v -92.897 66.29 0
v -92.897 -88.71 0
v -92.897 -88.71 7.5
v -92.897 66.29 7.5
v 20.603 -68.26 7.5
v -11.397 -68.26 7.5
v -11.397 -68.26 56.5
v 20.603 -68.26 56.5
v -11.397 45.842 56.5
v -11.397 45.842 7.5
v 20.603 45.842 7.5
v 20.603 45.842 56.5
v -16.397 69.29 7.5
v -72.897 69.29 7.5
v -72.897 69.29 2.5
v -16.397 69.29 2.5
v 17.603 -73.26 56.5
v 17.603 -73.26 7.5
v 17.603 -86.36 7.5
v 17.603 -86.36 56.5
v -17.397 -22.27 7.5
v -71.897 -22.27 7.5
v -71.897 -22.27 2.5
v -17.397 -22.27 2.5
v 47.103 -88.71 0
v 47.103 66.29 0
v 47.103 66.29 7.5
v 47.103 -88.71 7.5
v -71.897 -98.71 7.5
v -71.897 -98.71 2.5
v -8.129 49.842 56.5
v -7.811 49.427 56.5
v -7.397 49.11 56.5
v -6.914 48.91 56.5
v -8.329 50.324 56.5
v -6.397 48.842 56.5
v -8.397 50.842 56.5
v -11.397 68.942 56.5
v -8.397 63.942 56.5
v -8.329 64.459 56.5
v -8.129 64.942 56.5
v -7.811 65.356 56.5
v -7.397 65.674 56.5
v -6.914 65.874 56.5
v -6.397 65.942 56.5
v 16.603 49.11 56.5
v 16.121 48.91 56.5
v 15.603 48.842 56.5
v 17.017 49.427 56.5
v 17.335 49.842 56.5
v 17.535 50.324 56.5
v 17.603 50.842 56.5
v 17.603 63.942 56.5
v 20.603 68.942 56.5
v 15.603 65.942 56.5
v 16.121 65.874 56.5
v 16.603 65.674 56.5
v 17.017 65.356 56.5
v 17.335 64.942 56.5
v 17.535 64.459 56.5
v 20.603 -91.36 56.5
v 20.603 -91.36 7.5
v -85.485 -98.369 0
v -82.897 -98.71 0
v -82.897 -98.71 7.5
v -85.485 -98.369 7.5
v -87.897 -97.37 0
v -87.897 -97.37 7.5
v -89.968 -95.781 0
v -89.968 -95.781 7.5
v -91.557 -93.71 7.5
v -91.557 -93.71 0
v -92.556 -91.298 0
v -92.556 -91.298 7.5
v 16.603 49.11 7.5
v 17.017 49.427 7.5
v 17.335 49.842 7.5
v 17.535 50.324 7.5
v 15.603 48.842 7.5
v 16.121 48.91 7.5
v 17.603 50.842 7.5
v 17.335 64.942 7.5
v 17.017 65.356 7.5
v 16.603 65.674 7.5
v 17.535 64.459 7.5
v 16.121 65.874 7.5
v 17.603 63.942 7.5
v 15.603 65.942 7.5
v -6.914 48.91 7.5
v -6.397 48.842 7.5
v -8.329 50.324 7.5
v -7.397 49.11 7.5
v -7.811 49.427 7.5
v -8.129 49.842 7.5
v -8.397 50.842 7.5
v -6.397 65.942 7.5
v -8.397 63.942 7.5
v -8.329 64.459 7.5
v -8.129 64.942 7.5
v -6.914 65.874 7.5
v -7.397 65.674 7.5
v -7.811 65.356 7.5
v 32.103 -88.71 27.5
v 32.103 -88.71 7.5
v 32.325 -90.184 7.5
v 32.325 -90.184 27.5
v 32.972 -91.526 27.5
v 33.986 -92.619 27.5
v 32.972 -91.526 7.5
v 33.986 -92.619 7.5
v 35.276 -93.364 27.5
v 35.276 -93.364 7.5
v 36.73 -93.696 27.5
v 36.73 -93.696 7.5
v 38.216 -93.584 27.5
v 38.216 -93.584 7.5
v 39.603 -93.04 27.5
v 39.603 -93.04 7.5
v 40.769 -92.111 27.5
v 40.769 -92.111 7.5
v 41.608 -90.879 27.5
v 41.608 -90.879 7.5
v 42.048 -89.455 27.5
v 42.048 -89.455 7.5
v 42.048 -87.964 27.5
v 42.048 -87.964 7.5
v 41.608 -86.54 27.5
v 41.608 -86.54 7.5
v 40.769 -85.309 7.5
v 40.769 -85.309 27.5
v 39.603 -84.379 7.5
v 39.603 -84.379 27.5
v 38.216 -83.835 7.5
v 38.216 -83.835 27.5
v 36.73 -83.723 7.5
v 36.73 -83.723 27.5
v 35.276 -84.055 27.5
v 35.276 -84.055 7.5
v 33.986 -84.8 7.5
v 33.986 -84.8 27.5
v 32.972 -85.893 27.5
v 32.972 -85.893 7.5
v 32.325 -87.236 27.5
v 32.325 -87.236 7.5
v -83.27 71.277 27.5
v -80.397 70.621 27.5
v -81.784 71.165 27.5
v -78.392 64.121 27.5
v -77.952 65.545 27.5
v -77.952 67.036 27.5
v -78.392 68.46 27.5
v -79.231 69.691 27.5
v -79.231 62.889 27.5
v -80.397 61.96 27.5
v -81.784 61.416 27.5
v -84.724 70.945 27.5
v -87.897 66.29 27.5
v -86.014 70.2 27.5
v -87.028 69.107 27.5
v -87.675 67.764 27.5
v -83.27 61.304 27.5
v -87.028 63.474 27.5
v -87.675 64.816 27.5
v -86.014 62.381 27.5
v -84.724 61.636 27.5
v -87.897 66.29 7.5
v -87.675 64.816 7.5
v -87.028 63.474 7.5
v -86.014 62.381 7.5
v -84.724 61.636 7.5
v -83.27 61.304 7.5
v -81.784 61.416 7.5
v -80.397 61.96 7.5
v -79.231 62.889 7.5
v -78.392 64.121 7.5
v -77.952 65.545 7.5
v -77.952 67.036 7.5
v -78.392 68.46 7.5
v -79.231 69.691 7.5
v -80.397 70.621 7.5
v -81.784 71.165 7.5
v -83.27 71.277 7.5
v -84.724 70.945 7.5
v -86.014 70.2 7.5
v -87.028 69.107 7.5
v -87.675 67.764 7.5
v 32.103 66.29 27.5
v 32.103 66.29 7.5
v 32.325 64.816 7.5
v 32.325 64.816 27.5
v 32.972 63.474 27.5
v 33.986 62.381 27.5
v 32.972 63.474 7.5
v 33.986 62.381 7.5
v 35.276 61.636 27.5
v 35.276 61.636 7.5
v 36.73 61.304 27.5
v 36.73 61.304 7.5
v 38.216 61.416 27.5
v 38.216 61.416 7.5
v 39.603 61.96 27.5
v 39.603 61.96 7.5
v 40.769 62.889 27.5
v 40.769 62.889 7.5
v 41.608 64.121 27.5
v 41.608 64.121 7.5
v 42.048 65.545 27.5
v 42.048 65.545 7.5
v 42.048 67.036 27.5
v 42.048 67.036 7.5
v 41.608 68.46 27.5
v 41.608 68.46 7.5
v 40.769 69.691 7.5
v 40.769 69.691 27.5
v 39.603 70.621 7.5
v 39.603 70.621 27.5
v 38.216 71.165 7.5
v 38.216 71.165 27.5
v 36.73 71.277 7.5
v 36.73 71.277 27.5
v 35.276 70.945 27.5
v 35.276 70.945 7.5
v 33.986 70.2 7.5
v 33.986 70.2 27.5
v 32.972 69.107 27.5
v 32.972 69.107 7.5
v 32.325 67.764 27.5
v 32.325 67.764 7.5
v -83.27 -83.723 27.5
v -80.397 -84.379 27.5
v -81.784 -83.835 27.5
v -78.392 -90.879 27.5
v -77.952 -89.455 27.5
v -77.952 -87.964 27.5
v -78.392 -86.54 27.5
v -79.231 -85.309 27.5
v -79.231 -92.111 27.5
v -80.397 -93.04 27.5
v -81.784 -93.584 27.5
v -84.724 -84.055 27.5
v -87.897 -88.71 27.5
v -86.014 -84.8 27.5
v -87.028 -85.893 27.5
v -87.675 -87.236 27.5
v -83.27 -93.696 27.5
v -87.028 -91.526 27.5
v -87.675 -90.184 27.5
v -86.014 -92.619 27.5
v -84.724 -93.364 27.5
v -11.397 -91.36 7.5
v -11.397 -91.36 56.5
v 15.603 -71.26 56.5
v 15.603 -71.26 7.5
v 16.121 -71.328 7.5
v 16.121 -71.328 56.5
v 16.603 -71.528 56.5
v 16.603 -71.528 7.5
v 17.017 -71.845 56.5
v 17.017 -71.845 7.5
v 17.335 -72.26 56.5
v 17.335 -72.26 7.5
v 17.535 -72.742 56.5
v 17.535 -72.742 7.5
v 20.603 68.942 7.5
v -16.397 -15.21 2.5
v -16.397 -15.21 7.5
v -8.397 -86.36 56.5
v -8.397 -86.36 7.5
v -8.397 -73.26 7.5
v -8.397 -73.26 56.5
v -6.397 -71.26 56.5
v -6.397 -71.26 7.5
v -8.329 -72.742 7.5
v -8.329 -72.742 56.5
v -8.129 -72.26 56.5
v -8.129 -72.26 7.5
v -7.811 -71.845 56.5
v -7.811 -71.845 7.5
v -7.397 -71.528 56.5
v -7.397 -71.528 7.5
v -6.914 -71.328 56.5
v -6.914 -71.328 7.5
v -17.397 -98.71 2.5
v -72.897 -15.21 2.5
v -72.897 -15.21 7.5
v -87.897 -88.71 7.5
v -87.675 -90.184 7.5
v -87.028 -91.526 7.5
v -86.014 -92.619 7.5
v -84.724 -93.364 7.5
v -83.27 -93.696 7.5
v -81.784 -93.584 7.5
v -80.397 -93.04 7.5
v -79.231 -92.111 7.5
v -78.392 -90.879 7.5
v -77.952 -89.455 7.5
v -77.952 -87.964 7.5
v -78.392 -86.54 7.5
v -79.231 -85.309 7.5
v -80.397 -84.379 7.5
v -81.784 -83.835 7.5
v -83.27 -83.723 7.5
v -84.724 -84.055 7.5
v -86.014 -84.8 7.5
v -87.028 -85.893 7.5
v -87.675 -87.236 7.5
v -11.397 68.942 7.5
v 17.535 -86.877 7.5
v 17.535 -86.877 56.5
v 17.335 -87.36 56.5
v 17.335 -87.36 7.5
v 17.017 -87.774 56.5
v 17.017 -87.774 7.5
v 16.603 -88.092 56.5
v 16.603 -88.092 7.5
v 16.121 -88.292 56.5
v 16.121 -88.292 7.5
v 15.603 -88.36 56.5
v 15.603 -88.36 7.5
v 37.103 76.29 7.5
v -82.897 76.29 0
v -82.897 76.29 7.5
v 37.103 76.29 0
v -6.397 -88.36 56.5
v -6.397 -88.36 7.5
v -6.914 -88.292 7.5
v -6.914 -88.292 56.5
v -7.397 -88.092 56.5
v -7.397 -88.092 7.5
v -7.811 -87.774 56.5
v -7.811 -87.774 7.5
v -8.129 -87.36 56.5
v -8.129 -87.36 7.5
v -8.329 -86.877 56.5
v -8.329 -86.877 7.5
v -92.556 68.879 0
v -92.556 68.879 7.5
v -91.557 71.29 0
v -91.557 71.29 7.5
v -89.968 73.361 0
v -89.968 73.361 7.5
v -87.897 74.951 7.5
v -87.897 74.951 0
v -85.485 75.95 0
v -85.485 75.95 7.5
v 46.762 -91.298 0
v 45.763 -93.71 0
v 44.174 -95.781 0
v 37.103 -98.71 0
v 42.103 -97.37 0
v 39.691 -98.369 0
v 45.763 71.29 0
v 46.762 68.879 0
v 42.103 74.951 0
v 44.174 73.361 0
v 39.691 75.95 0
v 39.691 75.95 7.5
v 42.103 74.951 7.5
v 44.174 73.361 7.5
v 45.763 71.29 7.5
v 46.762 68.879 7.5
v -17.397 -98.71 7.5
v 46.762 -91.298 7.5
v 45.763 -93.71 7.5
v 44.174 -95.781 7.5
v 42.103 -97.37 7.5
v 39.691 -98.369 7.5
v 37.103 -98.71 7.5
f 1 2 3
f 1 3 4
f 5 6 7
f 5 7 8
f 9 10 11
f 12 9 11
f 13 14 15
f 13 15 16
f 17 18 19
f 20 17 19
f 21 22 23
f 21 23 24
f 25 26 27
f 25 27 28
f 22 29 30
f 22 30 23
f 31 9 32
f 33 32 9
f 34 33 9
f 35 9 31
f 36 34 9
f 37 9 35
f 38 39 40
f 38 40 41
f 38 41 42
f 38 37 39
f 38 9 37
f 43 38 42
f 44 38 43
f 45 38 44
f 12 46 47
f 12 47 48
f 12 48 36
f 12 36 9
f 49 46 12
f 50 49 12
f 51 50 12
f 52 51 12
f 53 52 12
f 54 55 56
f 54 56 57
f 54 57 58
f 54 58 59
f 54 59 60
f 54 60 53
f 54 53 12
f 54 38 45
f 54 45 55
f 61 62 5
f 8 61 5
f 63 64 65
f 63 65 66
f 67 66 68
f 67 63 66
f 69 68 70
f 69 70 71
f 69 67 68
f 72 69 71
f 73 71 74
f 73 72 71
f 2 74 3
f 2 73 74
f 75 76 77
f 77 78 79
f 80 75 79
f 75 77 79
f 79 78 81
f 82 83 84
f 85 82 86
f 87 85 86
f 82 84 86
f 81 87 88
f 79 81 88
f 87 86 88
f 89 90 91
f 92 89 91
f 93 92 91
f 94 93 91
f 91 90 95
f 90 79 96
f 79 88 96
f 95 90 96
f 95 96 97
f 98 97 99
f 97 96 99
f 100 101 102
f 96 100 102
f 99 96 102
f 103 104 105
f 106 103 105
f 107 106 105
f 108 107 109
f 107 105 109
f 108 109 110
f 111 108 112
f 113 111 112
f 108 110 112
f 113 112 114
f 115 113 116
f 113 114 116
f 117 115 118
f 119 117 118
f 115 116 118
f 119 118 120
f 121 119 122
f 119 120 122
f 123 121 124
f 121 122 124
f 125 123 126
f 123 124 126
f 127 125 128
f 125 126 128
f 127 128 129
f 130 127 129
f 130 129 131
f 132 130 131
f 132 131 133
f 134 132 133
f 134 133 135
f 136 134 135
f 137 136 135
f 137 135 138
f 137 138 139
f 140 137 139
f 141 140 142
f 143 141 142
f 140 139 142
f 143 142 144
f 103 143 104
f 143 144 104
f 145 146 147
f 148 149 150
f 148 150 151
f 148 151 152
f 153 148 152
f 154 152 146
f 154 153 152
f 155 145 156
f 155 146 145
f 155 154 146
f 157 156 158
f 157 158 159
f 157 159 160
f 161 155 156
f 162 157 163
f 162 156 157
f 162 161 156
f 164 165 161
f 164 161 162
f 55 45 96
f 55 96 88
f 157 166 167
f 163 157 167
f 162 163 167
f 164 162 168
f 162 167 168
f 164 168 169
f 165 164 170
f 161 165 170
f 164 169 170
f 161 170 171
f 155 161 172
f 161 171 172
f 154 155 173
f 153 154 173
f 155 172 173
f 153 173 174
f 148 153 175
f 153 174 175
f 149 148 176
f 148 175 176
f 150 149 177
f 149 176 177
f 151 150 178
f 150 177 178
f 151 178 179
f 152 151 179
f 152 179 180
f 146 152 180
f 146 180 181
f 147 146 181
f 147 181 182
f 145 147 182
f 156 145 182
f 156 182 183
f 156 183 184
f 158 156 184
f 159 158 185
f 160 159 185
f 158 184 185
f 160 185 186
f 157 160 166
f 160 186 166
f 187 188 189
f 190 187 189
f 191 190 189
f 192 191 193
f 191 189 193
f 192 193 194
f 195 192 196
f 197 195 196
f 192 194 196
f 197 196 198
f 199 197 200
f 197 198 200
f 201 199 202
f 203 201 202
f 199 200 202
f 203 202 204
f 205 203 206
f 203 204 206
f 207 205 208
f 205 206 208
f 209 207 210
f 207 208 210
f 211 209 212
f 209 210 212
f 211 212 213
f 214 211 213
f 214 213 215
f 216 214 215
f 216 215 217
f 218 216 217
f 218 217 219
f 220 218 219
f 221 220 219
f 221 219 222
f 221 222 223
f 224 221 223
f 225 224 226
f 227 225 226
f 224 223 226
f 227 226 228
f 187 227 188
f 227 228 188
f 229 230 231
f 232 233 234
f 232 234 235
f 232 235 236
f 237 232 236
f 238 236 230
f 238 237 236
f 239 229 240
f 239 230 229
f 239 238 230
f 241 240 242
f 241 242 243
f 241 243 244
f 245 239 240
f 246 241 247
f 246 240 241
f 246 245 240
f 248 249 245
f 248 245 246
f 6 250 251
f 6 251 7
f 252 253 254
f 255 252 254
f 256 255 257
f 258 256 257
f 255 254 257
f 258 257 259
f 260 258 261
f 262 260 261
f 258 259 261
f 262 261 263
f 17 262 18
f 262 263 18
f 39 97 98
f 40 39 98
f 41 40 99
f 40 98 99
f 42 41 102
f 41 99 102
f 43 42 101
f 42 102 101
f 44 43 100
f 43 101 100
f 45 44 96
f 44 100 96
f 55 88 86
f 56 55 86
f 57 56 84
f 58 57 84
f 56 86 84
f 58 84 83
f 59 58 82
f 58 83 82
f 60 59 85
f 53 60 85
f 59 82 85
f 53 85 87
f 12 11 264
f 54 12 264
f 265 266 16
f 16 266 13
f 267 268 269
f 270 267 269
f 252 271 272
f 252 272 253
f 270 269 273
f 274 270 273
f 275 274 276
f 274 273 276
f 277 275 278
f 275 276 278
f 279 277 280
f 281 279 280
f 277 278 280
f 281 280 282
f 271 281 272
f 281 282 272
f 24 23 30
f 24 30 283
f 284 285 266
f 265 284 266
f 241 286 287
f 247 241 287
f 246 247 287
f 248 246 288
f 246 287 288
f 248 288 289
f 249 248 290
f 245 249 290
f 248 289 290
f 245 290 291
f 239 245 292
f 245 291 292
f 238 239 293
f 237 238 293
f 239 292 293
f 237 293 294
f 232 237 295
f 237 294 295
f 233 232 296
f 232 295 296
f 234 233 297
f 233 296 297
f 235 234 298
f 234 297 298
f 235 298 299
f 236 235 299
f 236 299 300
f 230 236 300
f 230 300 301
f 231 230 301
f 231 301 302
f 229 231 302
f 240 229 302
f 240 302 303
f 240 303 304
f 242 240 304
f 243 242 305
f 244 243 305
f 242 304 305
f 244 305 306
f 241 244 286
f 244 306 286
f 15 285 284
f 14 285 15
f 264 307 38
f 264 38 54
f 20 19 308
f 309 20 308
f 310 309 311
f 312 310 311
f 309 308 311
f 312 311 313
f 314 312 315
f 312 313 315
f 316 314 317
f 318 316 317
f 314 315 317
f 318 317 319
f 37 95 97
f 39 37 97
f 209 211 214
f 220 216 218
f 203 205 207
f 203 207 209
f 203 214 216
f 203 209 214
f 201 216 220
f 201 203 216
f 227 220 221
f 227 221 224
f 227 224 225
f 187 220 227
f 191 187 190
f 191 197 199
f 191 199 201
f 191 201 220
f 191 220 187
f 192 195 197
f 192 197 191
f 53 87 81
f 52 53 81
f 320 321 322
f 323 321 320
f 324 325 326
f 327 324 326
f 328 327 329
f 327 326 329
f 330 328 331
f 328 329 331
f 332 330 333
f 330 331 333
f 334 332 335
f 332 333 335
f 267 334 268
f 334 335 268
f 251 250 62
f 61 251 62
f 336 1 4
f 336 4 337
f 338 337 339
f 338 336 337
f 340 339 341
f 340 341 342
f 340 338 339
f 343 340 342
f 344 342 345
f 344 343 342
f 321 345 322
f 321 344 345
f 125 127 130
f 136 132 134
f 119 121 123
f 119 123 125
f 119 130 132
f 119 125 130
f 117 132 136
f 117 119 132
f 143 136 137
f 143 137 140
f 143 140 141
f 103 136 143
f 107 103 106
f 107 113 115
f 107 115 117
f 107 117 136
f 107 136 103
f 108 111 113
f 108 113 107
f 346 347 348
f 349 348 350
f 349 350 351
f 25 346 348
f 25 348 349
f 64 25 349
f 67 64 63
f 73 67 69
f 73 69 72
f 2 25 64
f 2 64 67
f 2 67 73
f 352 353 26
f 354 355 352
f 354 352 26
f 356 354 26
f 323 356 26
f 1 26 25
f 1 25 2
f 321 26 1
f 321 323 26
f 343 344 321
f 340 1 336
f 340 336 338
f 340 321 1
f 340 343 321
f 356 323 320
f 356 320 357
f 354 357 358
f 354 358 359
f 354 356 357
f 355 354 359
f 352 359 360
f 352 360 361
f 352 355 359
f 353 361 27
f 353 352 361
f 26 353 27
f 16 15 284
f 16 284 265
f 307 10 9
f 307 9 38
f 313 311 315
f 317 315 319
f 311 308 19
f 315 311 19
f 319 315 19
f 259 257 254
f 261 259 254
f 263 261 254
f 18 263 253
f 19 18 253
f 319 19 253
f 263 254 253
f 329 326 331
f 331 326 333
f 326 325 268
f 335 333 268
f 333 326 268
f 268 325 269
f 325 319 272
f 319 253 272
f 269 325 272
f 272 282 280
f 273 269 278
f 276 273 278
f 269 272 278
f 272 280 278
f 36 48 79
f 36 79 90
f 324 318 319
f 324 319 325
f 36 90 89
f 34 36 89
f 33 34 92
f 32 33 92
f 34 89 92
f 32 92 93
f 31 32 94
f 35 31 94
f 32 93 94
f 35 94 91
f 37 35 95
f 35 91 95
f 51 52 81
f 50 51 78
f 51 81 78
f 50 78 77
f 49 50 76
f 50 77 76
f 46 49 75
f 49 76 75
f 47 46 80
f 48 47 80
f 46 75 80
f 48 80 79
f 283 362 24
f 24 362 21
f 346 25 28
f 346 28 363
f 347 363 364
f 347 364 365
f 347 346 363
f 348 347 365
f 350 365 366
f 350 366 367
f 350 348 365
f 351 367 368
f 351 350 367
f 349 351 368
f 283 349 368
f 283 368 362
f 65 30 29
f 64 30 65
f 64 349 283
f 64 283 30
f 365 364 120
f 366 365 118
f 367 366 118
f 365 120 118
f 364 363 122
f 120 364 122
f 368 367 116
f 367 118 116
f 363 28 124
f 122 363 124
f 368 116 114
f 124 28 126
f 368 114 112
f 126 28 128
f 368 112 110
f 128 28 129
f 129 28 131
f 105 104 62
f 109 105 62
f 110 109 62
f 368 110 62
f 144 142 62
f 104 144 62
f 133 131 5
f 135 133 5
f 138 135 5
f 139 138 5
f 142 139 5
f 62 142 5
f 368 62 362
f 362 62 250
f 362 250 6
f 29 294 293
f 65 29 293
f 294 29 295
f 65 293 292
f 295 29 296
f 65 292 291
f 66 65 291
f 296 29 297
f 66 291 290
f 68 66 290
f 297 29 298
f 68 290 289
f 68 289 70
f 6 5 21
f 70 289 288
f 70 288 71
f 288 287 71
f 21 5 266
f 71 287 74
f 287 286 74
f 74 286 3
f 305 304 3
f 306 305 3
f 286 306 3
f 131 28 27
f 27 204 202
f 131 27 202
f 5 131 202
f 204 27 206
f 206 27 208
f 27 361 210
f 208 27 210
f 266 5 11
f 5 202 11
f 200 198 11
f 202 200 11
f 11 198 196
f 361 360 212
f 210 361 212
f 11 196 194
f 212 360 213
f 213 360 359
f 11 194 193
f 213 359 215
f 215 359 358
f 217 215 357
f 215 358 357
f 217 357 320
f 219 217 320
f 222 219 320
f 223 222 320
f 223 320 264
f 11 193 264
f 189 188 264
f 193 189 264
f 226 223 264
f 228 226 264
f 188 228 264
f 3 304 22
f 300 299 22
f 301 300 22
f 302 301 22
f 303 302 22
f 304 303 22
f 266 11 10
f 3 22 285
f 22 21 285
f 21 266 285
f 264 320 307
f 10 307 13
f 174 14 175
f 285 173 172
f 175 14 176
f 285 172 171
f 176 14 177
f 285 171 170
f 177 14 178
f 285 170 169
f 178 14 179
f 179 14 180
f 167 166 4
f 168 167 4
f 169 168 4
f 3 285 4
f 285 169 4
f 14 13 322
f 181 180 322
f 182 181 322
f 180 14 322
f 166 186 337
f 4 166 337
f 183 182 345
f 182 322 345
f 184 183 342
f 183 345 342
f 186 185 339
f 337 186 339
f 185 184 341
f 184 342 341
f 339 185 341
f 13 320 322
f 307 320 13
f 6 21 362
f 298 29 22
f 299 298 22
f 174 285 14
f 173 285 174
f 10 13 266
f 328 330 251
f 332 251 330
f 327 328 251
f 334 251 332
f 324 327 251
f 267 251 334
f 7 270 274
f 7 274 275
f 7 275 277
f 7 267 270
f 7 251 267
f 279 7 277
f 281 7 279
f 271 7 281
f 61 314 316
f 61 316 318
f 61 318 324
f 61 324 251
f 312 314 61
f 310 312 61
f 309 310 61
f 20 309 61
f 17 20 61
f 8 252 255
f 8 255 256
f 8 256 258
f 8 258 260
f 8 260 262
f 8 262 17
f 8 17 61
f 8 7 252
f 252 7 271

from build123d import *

# Parameters (mm, degrees)
BOSS_EXTRUDE1_DEPTH = 7.5
SKETCH3_W           = 56.5
SKETCH3_H           = 84.5
SKETCH3_W_2         = 54.5
SKETCH3_H_2         = 69.44
CUT_EXTRUDE1_DEPTH  = 5
SKETCH4_W           = 54.5
SKETCH4_H           = 9.636528607
CUT_EXTRUDE2_DEPTH  = 5
SKETCH5_W           = 32
SKETCH5_H           = 23.1
BOSS_EXTRUDE2_DEPTH = 49
SKETCH6_W           = 32
SKETCH6_H           = 23.1
BOSS_EXTRUDE3_DEPTH = 49
SKETCH7_R           = 5.000174567
BOSS_EXTRUDE4_DEPTH = 20


with BuildPart() as part:
    # Sketch2 → Boss-Extrude1 (new body)
    with BuildSketch(Plane.XY):
        with BuildLine():
            Line((-82.896774194, 76.290322581), (37.103225806, 76.290322581))
            ThreePointArc((37.103225806, 76.290322581), (44.174293618, 73.361390393), (47.103225806, 66.290322581))
            Line((47.103225806, 66.290322581), (47.103225806, -88.709677419))
            ThreePointArc((47.103225806, -88.709677419), (44.174293618, -95.780745231), (37.103225806, -98.709677419))
            Line((37.103225806, -98.709677419), (-82.896774194, -98.709677419))
            ThreePointArc((-82.896774194, -98.709677419), (-89.967842005, -95.780745231), (-92.896774194, -88.709677419))
            Line((-92.896774194, -88.709677419), (-92.896774194, 66.290322581))
            ThreePointArc((-92.896774194, 66.290322581), (-89.967842005, 73.361390393), (-82.896774194, 76.290322581))
        make_face()
    extrude(amount=BOSS_EXTRUDE1_DEPTH)

    # Sketch3 → Cut-Extrude1 (cut)
    with BuildSketch(Plane.XY.offset(7.5)):
        with Locations((-44.646774194, 27.040322581)):
            Rectangle(SKETCH3_W, SKETCH3_H)
        with Locations((-44.646774194, -56.989677419)):
            Rectangle(SKETCH3_W_2, SKETCH3_H_2)
    extrude(amount=-CUT_EXTRUDE1_DEPTH, mode=Mode.SUBTRACT)

    # Sketch4 → Cut-Extrude2 (cut)
    with BuildSketch(Plane.XY.offset(7.5)):
        with Locations((-44.646774194, -96.527941723)):
            Rectangle(SKETCH4_W, SKETCH4_H)
    extrude(amount=-CUT_EXTRUDE2_DEPTH, mode=Mode.SUBTRACT)

    # Sketch5 → Boss-Extrude2 (add)
    with BuildSketch(Plane.XY.offset(7.5)):
        with Locations((4.603225806, 57.39165706)):
            Rectangle(SKETCH5_W, SKETCH5_H)
        with BuildLine():
            Line((-6.396774194, 65.94165706), (15.603225806, 65.94165706))
            ThreePointArc((15.603225806, 65.94165706), (17.017439369, 65.355870623), (17.603225806, 63.94165706))
            Line((17.603225806, 63.94165706), (17.603225806, 50.84165706))
            ThreePointArc((17.603225806, 50.84165706), (17.017439369, 49.427443498), (15.603225806, 48.84165706))
            Line((15.603225806, 48.84165706), (-6.396774194, 48.84165706))
            ThreePointArc((-6.396774194, 48.84165706), (-7.810987756, 49.427443498), (-8.396774194, 50.84165706))
            Line((-8.396774194, 50.84165706), (-8.396774194, 63.94165706))
            ThreePointArc((-8.396774194, 63.94165706), (-7.810987756, 65.355870623), (-6.396774194, 65.94165706))
        make_face(mode=Mode.SUBTRACT)
    extrude(amount=BOSS_EXTRUDE2_DEPTH)

    # Sketch6 → Boss-Extrude3 (add)
    with BuildSketch(Plane.XY.offset(7.5)):
        with Locations((4.603225806, -79.809677419)):
            Rectangle(SKETCH6_W, SKETCH6_H)
        with BuildLine():
            Line((-6.396774194, -71.259677419), (15.603225806, -71.259677419))
            ThreePointArc((15.603225806, -71.259677419), (17.017439369, -71.845463857), (17.603225806, -73.259677419))
            Line((17.603225806, -73.259677419), (17.603225806, -86.359677419))
            ThreePointArc((17.603225806, -86.359677419), (17.017439369, -87.773890982), (15.603225806, -88.359677419))
            Line((15.603225806, -88.359677419), (-6.396774194, -88.359677419))
            ThreePointArc((-6.396774194, -88.359677419), (-7.810987756, -87.773890982), (-8.396774194, -86.359677419))
            Line((-8.396774194, -86.359677419), (-8.396774194, -73.259677419))
            ThreePointArc((-8.396774194, -73.259677419), (-7.810987756, -71.845463857), (-6.396774194, -71.259677419))
        make_face(mode=Mode.SUBTRACT)
    extrude(amount=BOSS_EXTRUDE3_DEPTH)

    # Sketch7 → Boss-Extrude4 (add)
    with BuildSketch(Plane.XY.offset(7.5)):
        with Locations((-82.896774194, 66.290322581)):
            Circle(SKETCH7_R)
        with Locations((37.103225806, 66.290322581)):
            Circle(SKETCH7_R)
        with Locations((-82.896774194, -88.709677419)):
            Circle(SKETCH7_R)
        with Locations((37.103225806, -88.709677419)):
            Circle(SKETCH7_R)
    extrude(amount=BOSS_EXTRUDE4_DEPTH)


solid = part.part
